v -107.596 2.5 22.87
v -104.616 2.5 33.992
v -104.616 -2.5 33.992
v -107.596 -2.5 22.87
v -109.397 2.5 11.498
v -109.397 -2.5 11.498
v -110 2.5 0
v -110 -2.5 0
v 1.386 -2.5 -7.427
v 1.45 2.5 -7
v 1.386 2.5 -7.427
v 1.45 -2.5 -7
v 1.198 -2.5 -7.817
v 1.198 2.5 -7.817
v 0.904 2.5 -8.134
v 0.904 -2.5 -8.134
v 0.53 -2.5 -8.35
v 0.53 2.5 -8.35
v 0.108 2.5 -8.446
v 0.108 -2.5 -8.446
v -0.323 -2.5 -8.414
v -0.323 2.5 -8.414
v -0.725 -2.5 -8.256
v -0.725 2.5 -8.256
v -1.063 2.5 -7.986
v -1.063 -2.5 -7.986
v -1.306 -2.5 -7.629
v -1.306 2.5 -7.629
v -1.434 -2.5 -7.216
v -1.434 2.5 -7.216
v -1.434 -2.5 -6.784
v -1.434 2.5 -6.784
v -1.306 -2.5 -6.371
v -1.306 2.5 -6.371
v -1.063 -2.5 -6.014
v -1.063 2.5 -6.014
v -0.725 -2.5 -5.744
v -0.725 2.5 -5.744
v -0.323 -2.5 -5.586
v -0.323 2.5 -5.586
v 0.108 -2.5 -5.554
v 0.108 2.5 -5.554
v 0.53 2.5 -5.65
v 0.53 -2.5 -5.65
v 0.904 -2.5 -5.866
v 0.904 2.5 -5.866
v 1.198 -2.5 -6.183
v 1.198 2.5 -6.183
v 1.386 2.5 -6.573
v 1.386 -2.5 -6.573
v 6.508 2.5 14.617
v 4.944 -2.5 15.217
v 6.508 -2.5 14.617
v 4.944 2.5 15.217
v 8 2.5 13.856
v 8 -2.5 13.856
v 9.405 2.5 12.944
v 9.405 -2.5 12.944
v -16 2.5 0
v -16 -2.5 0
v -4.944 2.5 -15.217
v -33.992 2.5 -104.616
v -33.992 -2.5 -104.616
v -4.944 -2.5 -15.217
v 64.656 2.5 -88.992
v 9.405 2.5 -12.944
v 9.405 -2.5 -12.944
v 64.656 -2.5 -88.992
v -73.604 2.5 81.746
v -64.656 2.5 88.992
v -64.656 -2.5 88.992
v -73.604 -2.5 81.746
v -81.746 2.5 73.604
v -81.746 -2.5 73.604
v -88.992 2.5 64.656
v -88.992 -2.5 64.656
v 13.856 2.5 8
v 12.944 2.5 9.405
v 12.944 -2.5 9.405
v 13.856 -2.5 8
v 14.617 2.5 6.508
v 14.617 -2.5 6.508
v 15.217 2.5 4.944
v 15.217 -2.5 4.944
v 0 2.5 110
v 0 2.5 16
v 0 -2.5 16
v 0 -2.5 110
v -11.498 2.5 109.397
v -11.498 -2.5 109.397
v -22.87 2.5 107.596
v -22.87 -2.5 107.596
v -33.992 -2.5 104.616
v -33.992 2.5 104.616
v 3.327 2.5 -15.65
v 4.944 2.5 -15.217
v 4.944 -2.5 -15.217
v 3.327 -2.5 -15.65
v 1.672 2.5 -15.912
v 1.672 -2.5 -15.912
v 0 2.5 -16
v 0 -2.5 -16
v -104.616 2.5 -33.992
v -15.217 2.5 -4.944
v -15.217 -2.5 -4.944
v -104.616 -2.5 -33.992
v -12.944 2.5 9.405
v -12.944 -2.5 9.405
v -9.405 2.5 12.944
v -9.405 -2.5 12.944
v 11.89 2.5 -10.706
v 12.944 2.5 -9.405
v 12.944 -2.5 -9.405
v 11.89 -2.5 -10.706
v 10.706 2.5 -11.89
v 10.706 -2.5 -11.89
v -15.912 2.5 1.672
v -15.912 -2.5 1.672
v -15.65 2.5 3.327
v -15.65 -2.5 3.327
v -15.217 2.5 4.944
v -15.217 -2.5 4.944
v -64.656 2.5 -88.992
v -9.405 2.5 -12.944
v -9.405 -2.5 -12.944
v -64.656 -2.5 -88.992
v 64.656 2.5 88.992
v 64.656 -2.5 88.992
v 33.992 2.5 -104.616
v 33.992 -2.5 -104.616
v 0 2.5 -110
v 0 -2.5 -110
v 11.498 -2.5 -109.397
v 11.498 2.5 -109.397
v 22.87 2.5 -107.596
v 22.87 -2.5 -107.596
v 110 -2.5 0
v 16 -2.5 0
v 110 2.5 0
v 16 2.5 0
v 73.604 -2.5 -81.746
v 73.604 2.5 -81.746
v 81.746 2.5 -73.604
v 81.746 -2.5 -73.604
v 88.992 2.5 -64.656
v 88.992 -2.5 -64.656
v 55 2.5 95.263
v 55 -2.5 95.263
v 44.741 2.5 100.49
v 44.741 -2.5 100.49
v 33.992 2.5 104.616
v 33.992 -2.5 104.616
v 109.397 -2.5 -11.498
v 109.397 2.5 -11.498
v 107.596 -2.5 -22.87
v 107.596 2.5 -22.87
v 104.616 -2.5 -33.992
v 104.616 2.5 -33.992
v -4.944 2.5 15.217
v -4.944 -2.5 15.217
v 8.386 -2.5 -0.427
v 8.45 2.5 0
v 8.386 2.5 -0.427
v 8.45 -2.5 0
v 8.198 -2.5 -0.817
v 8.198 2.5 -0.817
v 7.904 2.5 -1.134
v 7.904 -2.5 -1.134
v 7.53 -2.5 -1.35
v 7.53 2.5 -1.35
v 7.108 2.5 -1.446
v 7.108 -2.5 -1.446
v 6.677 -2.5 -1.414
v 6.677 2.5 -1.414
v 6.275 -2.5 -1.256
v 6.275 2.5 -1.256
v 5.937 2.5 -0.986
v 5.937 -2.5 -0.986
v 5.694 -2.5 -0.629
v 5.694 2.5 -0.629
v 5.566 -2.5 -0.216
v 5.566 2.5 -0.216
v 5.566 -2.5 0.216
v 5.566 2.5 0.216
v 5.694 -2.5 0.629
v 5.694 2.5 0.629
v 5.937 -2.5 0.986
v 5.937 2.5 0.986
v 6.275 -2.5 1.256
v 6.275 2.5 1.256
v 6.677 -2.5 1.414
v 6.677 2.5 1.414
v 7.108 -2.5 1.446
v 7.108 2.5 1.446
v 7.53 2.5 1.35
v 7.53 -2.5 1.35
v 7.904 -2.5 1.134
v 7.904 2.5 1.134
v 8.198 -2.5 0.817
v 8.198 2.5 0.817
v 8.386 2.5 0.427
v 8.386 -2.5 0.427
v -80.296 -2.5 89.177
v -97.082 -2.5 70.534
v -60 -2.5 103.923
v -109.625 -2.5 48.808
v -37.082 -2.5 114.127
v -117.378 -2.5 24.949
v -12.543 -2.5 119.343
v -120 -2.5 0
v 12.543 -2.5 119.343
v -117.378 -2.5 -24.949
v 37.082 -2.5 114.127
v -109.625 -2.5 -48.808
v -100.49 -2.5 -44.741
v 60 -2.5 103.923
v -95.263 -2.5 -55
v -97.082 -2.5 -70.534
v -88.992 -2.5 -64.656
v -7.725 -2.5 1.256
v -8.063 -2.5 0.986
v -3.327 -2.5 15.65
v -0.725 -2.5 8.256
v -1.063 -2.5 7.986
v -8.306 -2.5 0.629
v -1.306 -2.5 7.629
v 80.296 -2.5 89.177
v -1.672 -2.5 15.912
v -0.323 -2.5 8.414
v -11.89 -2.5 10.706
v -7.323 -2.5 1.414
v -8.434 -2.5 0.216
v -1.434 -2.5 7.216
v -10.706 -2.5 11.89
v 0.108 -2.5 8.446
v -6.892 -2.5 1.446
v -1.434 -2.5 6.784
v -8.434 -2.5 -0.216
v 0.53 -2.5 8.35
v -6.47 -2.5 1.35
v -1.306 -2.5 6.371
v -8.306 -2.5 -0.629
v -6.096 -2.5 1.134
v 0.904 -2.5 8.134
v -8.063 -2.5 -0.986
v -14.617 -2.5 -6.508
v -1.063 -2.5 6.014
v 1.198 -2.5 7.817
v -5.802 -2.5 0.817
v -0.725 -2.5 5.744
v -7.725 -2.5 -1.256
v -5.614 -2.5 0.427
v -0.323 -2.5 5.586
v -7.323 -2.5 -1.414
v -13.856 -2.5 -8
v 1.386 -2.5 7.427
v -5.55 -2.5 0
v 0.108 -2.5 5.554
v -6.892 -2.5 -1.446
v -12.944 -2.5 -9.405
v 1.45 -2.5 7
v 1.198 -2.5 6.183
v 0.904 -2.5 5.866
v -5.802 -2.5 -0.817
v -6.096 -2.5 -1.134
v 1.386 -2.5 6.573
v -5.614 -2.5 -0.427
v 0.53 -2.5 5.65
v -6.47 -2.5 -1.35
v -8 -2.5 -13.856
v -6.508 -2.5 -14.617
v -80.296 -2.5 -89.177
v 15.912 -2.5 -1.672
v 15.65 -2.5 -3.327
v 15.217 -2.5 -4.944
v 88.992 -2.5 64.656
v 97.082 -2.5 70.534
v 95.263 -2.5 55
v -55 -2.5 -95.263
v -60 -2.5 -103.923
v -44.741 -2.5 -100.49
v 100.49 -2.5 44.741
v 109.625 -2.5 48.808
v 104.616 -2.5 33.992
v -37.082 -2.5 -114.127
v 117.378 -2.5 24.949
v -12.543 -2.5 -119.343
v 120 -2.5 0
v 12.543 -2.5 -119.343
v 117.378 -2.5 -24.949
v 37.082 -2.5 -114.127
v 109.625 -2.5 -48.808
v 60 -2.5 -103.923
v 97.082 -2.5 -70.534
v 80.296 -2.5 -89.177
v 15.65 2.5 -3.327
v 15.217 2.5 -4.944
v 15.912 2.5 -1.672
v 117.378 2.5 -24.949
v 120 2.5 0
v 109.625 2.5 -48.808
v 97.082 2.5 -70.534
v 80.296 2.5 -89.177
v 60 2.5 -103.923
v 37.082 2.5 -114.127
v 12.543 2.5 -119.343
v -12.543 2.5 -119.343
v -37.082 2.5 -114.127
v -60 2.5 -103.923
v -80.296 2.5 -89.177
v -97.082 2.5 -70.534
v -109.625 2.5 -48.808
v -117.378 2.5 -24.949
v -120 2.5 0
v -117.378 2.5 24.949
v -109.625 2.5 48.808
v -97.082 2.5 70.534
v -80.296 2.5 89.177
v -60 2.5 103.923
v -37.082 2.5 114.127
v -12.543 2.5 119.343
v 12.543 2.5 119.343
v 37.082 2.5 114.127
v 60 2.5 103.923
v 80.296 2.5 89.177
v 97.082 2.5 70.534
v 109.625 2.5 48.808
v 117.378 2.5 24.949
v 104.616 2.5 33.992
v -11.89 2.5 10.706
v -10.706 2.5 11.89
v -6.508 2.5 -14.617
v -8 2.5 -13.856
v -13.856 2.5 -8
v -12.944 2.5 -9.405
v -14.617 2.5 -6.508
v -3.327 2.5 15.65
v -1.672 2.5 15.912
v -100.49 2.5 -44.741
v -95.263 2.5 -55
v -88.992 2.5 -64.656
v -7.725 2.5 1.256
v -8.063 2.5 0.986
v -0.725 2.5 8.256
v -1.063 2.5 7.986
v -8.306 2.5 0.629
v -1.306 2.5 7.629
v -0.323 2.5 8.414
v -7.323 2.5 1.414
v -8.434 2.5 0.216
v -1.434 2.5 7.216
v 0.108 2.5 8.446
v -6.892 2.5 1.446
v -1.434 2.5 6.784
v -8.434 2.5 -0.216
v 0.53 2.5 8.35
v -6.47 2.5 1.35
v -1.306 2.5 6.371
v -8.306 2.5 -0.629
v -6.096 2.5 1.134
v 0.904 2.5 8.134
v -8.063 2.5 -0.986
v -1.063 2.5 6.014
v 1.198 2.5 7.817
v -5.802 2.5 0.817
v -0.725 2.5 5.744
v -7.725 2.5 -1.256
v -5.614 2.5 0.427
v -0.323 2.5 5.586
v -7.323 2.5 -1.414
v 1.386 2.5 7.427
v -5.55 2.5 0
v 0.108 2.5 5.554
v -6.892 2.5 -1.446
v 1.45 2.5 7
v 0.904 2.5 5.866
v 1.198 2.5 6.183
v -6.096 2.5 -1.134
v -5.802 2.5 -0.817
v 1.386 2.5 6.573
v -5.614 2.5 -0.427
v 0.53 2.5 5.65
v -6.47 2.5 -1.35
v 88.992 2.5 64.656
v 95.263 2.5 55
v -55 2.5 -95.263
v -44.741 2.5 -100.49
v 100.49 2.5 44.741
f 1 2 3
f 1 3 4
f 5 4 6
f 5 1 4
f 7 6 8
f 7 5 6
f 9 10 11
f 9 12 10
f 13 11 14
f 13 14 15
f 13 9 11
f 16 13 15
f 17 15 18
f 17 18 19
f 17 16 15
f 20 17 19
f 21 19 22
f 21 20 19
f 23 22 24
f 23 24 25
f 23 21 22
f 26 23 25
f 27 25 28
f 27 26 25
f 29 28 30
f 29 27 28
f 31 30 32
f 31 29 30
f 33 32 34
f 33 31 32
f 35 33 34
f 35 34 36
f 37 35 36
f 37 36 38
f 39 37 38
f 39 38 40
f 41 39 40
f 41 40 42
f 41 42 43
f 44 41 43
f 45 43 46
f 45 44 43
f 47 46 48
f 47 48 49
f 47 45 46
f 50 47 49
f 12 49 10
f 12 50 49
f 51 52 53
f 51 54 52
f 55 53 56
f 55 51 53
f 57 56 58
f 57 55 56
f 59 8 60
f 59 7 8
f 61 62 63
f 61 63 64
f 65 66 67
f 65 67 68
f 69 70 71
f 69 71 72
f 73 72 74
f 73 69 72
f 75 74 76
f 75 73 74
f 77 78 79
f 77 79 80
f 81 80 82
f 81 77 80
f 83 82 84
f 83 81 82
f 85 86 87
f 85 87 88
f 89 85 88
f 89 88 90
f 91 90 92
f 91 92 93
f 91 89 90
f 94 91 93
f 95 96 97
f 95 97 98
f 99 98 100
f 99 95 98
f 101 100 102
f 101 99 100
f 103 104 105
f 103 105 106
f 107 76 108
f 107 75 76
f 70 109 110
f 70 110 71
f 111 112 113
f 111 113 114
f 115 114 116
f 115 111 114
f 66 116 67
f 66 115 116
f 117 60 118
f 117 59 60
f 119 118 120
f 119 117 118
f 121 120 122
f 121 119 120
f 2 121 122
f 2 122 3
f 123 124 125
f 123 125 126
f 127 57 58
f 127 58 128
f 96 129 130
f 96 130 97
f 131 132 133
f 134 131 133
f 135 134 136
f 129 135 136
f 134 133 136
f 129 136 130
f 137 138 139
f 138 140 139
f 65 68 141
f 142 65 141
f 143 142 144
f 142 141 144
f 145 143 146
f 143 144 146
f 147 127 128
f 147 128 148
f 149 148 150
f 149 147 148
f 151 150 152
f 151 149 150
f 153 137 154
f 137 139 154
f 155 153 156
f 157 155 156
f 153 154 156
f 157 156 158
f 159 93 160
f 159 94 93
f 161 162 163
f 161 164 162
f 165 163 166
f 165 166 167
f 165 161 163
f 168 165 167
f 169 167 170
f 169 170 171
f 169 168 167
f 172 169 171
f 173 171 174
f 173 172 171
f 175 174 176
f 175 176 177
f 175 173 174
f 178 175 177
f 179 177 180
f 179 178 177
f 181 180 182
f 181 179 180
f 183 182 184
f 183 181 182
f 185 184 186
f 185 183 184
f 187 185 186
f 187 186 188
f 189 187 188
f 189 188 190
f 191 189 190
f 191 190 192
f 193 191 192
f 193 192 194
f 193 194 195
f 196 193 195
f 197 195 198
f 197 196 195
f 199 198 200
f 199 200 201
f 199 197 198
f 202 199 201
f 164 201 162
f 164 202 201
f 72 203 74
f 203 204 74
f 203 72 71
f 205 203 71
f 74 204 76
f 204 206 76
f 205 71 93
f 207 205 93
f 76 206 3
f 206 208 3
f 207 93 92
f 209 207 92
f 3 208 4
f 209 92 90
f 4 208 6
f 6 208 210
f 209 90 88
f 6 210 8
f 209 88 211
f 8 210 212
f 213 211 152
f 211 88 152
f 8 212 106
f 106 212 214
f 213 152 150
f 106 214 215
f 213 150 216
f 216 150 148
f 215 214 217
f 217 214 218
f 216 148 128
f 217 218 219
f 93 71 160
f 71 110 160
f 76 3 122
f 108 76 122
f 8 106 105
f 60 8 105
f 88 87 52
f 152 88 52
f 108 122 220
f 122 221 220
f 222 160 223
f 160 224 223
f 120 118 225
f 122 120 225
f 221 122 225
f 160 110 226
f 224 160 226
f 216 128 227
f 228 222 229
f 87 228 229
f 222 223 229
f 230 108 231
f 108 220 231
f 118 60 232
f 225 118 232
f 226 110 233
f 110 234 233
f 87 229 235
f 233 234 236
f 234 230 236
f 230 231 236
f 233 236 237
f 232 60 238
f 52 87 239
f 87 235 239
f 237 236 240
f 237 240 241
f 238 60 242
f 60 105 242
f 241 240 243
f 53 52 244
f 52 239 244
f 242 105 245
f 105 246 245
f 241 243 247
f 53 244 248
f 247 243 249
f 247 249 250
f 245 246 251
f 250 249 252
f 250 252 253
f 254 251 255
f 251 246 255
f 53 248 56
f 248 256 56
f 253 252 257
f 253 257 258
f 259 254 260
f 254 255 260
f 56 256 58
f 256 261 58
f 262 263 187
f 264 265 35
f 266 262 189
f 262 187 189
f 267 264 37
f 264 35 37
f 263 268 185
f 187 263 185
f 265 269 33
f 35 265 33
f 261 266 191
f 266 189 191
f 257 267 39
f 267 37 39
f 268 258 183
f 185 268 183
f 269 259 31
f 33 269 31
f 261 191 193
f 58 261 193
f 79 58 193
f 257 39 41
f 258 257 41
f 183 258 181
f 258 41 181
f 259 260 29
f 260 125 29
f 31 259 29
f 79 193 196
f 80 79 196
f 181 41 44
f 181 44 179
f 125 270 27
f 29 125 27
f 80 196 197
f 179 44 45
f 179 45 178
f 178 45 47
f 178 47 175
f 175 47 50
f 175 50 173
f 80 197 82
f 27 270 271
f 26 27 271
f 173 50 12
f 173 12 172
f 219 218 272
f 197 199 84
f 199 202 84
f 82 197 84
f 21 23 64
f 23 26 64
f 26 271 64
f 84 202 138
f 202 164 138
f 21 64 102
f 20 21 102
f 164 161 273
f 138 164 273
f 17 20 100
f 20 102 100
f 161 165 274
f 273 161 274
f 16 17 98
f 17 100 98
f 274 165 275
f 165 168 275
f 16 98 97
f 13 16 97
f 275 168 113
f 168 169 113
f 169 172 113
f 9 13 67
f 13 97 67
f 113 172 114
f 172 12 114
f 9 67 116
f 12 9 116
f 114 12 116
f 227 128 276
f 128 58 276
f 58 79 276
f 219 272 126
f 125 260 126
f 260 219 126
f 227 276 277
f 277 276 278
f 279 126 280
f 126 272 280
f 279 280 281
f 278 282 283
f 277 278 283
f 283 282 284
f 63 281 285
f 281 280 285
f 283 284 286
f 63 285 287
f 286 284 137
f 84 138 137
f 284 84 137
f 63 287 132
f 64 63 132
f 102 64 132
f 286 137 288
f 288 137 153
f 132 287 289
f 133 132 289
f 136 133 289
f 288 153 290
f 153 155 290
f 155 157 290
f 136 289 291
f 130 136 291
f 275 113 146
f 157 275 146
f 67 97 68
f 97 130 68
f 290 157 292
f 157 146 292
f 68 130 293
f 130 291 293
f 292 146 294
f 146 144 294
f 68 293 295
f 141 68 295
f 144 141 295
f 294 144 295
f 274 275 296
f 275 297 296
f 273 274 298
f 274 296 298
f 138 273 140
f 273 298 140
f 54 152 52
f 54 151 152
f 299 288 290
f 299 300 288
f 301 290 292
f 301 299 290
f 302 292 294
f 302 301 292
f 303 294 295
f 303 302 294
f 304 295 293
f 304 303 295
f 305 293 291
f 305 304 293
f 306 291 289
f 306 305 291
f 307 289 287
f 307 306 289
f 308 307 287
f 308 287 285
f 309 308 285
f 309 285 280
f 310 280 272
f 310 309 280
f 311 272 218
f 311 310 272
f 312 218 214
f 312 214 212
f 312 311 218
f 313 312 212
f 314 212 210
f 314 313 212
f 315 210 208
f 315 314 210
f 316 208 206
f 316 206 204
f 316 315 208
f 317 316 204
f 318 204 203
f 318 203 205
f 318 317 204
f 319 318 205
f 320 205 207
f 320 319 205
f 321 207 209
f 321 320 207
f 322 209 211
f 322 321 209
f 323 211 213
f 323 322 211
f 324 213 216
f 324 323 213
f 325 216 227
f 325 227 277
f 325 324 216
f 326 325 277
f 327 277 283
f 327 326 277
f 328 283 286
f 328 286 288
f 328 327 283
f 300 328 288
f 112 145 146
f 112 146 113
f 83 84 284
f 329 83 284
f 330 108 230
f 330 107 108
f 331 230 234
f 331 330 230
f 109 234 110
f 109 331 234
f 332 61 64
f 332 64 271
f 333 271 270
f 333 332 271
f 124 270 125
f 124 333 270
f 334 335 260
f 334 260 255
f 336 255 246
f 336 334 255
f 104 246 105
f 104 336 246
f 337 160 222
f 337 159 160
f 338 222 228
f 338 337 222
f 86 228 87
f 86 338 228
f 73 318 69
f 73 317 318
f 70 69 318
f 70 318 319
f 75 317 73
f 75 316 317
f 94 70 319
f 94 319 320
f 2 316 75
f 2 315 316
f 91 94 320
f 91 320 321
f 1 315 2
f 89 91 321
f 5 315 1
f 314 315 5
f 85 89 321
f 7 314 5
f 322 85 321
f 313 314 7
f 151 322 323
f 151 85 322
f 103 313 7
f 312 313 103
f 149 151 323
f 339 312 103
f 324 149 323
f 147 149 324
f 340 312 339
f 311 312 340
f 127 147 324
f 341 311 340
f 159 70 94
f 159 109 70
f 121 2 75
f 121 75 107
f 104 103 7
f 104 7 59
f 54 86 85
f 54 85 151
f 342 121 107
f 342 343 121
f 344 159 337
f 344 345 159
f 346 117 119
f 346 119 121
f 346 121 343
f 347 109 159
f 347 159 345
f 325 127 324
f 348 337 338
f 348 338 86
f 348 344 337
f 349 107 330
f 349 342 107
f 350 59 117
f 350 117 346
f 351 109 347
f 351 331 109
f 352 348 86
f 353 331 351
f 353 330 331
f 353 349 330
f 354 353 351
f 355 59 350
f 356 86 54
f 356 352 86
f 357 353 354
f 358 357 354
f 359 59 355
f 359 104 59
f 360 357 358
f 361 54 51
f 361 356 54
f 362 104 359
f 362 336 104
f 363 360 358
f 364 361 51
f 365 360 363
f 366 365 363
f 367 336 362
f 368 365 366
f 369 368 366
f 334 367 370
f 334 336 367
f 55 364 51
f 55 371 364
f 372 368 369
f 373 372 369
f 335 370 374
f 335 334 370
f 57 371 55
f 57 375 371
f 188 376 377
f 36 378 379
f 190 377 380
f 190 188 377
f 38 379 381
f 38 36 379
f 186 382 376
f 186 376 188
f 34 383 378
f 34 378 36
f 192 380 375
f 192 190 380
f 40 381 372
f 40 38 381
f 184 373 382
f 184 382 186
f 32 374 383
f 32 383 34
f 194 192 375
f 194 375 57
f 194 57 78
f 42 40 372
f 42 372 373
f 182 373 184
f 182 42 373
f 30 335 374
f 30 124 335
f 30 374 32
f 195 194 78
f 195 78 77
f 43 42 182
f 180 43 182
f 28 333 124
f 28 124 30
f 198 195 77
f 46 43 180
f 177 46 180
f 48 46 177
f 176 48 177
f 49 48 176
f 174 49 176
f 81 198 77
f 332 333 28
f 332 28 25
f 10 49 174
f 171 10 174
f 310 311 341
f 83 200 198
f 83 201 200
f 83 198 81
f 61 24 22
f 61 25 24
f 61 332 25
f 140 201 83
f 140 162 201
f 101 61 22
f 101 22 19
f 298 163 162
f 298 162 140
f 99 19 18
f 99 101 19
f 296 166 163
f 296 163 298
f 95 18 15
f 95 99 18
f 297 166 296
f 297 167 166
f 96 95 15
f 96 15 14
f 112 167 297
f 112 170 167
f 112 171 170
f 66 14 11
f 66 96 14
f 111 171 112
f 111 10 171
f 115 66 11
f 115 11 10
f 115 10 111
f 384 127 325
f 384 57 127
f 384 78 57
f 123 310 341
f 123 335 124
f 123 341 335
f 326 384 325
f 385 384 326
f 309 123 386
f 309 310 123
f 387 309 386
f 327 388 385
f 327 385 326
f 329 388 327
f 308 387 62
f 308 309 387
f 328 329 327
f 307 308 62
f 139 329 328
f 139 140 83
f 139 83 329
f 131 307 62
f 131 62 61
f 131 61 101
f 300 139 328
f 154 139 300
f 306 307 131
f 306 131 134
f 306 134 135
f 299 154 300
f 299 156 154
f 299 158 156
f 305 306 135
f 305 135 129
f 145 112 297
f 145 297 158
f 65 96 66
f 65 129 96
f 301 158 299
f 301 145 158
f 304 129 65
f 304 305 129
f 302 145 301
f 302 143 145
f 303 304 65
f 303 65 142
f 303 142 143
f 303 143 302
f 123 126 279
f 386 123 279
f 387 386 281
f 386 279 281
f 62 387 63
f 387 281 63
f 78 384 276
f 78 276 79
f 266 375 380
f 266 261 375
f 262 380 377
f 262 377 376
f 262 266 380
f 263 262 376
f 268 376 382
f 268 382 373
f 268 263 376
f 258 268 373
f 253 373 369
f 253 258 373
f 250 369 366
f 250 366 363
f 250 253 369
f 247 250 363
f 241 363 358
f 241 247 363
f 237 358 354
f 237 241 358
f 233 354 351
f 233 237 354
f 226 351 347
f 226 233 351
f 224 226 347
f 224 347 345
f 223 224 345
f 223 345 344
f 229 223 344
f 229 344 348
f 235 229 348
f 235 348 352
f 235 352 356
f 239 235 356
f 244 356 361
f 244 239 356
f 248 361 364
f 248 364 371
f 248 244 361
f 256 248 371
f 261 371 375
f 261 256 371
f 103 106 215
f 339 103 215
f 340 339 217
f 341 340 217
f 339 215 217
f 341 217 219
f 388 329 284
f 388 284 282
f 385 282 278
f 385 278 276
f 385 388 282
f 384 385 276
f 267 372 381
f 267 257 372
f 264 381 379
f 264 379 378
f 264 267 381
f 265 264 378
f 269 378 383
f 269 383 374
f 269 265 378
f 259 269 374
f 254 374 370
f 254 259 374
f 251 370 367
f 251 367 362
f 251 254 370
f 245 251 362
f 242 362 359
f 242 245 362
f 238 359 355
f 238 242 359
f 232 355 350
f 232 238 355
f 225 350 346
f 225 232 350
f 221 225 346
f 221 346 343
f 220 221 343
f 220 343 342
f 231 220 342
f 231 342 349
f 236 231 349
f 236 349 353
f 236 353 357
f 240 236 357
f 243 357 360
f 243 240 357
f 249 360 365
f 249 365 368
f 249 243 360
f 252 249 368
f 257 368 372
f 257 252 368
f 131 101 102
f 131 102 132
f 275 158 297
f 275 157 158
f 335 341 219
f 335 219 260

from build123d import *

# Parameters (mm, degrees)
SKETCH_1_R      = 120
SKETCH_1_R_2    = 1.45
EXTRUDE_1_DEPTH = 2.5


with BuildPart() as part:
    # 草图1 → 凸台-拉伸1 (new body, symmetric)
    with BuildSketch(Plane(origin=(0, 0, 0), x_dir=(1, 0, 0), z_dir=(0, 1, 0))):
        Circle(SKETCH_1_R)
        with Locations((7, 0)):
            Circle(SKETCH_1_R_2, mode=Mode.SUBTRACT)
        with Locations((0, 7)):
            Circle(SKETCH_1_R_2, mode=Mode.SUBTRACT)
        with Locations((-7, 0)):
            Circle(SKETCH_1_R_2, mode=Mode.SUBTRACT)
        with Locations((0, -7)):
            Circle(SKETCH_1_R_2, mode=Mode.SUBTRACT)
        with BuildLine():
            Line((16, 0), (110, 0))
            ThreePointArc((110, 0), (108.645717465, 17.207791154), (104.616216792, 33.991869381))
            Line((104.616216792, 33.991869381), (15.216904261, 4.94427191))
            ThreePointArc((15.216904261, 4.94427191), (15.80301345, 2.502951441), (16, 0))
        make_face(mode=Mode.SUBTRACT)
        with BuildLine():
            Line((9.404564037, 12.94427191), (64.656377752, 88.991869381))
            ThreePointArc((64.656377752, 88.991869381), (77.781745931, 77.781745931), (88.991869381, 64.656377752))
            Line((88.991869381, 64.656377752), (12.94427191, 9.404564037))
            ThreePointArc((12.94427191, 9.404564037), (11.313708499, 11.313708499), (9.404564037, 12.94427191))
        make_face(mode=Mode.SUBTRACT)
        with BuildLine():
            Line((0, 16), (0, 110))
            ThreePointArc((0, 110), (17.207791154, 108.645717465), (33.991869381, 104.616216792))
            Line((33.991869381, 104.616216792), (4.94427191, 15.216904261))
            ThreePointArc((4.94427191, 15.216904261), (2.502951441, 15.80301345), (0, 16))
        make_face(mode=Mode.SUBTRACT)
        with BuildLine():
            Line((-9.404564037, 12.94427191), (-64.656377752, 88.991869381))
            ThreePointArc((-64.656377752, 88.991869381), (-49.938954971, 98.010717661), (-33.991869381, 104.616216792))
            Line((-33.991869381, 104.616216792), (-4.94427191, 15.216904261))
            ThreePointArc((-4.94427191, 15.216904261), (-7.263847996, 14.256104387), (-9.404564037, 12.94427191))
        make_face(mode=Mode.SUBTRACT)
        with BuildLine():
            Line((-15.216904261, 4.94427191), (-104.616216792, 33.991869381))
            ThreePointArc((-104.616216792, 33.991869381), (-98.010717661, 49.938954971), (-88.991869381, 64.656377752))
            Line((-88.991869381, 64.656377752), (-12.94427191, 9.404564037))
            ThreePointArc((-12.94427191, 9.404564037), (-14.256104387, 7.263847996), (-15.216904261, 4.94427191))
        make_face(mode=Mode.SUBTRACT)
        with BuildLine():
            Line((-15.216904261, -4.94427191), (-104.616216792, -33.991869381))
            ThreePointArc((-104.616216792, -33.991869381), (-108.645717465, -17.207791154), (-110, 0))
            Line((-110, 0), (-16, 0))
            ThreePointArc((-16, 0), (-15.80301345, -2.502951441), (-15.216904261, -4.94427191))
        make_face(mode=Mode.SUBTRACT)
        with BuildLine():
            Line((-9.404564037, -12.94427191), (-64.656377752, -88.991869381))
            ThreePointArc((-64.656377752, -88.991869381), (-77.781745931, -77.781745931), (-88.991869381, -64.656377752))
            Line((-88.991869381, -64.656377752), (-12.94427191, -9.404564037))
            ThreePointArc((-12.94427191, -9.404564037), (-11.313708499, -11.313708499), (-9.404564037, -12.94427191))
        make_face(mode=Mode.SUBTRACT)
        with BuildLine():
            Line((0, -16), (0, -110))
            ThreePointArc((0, -110), (-17.207791154, -108.645717465), (-33.991869381, -104.616216792))
            Line((-33.991869381, -104.616216792), (-4.94427191, -15.216904261))
            ThreePointArc((-4.94427191, -15.216904261), (-2.502951441, -15.80301345), (0, -16))
        make_face(mode=Mode.SUBTRACT)
        with BuildLine():
            Line((9.404564037, -12.94427191), (64.656377752, -88.991869381))
            ThreePointArc((64.656377752, -88.991869381), (49.938954971, -98.010717661), (33.991869381, -104.616216792))
            Line((33.991869381, -104.616216792), (4.94427191, -15.216904261))
            ThreePointArc((4.94427191, -15.216904261), (7.263847996, -14.256104387), (9.404564037, -12.94427191))
        make_face(mode=Mode.SUBTRACT)
        with BuildLine():
            Line((15.216904261, -4.94427191), (104.616216792, -33.991869381))
            ThreePointArc((104.616216792, -33.991869381), (98.010717661, -49.938954971), (88.991869381, -64.656377752))
            Line((88.991869381, -64.656377752), (12.94427191, -9.404564037))
            ThreePointArc((12.94427191, -9.404564037), (14.256104387, -7.263847996), (15.216904261, -4.94427191))
        make_face(mode=Mode.SUBTRACT)
    extrude(amount=EXTRUDE_1_DEPTH, both=True)


solid = part.part
